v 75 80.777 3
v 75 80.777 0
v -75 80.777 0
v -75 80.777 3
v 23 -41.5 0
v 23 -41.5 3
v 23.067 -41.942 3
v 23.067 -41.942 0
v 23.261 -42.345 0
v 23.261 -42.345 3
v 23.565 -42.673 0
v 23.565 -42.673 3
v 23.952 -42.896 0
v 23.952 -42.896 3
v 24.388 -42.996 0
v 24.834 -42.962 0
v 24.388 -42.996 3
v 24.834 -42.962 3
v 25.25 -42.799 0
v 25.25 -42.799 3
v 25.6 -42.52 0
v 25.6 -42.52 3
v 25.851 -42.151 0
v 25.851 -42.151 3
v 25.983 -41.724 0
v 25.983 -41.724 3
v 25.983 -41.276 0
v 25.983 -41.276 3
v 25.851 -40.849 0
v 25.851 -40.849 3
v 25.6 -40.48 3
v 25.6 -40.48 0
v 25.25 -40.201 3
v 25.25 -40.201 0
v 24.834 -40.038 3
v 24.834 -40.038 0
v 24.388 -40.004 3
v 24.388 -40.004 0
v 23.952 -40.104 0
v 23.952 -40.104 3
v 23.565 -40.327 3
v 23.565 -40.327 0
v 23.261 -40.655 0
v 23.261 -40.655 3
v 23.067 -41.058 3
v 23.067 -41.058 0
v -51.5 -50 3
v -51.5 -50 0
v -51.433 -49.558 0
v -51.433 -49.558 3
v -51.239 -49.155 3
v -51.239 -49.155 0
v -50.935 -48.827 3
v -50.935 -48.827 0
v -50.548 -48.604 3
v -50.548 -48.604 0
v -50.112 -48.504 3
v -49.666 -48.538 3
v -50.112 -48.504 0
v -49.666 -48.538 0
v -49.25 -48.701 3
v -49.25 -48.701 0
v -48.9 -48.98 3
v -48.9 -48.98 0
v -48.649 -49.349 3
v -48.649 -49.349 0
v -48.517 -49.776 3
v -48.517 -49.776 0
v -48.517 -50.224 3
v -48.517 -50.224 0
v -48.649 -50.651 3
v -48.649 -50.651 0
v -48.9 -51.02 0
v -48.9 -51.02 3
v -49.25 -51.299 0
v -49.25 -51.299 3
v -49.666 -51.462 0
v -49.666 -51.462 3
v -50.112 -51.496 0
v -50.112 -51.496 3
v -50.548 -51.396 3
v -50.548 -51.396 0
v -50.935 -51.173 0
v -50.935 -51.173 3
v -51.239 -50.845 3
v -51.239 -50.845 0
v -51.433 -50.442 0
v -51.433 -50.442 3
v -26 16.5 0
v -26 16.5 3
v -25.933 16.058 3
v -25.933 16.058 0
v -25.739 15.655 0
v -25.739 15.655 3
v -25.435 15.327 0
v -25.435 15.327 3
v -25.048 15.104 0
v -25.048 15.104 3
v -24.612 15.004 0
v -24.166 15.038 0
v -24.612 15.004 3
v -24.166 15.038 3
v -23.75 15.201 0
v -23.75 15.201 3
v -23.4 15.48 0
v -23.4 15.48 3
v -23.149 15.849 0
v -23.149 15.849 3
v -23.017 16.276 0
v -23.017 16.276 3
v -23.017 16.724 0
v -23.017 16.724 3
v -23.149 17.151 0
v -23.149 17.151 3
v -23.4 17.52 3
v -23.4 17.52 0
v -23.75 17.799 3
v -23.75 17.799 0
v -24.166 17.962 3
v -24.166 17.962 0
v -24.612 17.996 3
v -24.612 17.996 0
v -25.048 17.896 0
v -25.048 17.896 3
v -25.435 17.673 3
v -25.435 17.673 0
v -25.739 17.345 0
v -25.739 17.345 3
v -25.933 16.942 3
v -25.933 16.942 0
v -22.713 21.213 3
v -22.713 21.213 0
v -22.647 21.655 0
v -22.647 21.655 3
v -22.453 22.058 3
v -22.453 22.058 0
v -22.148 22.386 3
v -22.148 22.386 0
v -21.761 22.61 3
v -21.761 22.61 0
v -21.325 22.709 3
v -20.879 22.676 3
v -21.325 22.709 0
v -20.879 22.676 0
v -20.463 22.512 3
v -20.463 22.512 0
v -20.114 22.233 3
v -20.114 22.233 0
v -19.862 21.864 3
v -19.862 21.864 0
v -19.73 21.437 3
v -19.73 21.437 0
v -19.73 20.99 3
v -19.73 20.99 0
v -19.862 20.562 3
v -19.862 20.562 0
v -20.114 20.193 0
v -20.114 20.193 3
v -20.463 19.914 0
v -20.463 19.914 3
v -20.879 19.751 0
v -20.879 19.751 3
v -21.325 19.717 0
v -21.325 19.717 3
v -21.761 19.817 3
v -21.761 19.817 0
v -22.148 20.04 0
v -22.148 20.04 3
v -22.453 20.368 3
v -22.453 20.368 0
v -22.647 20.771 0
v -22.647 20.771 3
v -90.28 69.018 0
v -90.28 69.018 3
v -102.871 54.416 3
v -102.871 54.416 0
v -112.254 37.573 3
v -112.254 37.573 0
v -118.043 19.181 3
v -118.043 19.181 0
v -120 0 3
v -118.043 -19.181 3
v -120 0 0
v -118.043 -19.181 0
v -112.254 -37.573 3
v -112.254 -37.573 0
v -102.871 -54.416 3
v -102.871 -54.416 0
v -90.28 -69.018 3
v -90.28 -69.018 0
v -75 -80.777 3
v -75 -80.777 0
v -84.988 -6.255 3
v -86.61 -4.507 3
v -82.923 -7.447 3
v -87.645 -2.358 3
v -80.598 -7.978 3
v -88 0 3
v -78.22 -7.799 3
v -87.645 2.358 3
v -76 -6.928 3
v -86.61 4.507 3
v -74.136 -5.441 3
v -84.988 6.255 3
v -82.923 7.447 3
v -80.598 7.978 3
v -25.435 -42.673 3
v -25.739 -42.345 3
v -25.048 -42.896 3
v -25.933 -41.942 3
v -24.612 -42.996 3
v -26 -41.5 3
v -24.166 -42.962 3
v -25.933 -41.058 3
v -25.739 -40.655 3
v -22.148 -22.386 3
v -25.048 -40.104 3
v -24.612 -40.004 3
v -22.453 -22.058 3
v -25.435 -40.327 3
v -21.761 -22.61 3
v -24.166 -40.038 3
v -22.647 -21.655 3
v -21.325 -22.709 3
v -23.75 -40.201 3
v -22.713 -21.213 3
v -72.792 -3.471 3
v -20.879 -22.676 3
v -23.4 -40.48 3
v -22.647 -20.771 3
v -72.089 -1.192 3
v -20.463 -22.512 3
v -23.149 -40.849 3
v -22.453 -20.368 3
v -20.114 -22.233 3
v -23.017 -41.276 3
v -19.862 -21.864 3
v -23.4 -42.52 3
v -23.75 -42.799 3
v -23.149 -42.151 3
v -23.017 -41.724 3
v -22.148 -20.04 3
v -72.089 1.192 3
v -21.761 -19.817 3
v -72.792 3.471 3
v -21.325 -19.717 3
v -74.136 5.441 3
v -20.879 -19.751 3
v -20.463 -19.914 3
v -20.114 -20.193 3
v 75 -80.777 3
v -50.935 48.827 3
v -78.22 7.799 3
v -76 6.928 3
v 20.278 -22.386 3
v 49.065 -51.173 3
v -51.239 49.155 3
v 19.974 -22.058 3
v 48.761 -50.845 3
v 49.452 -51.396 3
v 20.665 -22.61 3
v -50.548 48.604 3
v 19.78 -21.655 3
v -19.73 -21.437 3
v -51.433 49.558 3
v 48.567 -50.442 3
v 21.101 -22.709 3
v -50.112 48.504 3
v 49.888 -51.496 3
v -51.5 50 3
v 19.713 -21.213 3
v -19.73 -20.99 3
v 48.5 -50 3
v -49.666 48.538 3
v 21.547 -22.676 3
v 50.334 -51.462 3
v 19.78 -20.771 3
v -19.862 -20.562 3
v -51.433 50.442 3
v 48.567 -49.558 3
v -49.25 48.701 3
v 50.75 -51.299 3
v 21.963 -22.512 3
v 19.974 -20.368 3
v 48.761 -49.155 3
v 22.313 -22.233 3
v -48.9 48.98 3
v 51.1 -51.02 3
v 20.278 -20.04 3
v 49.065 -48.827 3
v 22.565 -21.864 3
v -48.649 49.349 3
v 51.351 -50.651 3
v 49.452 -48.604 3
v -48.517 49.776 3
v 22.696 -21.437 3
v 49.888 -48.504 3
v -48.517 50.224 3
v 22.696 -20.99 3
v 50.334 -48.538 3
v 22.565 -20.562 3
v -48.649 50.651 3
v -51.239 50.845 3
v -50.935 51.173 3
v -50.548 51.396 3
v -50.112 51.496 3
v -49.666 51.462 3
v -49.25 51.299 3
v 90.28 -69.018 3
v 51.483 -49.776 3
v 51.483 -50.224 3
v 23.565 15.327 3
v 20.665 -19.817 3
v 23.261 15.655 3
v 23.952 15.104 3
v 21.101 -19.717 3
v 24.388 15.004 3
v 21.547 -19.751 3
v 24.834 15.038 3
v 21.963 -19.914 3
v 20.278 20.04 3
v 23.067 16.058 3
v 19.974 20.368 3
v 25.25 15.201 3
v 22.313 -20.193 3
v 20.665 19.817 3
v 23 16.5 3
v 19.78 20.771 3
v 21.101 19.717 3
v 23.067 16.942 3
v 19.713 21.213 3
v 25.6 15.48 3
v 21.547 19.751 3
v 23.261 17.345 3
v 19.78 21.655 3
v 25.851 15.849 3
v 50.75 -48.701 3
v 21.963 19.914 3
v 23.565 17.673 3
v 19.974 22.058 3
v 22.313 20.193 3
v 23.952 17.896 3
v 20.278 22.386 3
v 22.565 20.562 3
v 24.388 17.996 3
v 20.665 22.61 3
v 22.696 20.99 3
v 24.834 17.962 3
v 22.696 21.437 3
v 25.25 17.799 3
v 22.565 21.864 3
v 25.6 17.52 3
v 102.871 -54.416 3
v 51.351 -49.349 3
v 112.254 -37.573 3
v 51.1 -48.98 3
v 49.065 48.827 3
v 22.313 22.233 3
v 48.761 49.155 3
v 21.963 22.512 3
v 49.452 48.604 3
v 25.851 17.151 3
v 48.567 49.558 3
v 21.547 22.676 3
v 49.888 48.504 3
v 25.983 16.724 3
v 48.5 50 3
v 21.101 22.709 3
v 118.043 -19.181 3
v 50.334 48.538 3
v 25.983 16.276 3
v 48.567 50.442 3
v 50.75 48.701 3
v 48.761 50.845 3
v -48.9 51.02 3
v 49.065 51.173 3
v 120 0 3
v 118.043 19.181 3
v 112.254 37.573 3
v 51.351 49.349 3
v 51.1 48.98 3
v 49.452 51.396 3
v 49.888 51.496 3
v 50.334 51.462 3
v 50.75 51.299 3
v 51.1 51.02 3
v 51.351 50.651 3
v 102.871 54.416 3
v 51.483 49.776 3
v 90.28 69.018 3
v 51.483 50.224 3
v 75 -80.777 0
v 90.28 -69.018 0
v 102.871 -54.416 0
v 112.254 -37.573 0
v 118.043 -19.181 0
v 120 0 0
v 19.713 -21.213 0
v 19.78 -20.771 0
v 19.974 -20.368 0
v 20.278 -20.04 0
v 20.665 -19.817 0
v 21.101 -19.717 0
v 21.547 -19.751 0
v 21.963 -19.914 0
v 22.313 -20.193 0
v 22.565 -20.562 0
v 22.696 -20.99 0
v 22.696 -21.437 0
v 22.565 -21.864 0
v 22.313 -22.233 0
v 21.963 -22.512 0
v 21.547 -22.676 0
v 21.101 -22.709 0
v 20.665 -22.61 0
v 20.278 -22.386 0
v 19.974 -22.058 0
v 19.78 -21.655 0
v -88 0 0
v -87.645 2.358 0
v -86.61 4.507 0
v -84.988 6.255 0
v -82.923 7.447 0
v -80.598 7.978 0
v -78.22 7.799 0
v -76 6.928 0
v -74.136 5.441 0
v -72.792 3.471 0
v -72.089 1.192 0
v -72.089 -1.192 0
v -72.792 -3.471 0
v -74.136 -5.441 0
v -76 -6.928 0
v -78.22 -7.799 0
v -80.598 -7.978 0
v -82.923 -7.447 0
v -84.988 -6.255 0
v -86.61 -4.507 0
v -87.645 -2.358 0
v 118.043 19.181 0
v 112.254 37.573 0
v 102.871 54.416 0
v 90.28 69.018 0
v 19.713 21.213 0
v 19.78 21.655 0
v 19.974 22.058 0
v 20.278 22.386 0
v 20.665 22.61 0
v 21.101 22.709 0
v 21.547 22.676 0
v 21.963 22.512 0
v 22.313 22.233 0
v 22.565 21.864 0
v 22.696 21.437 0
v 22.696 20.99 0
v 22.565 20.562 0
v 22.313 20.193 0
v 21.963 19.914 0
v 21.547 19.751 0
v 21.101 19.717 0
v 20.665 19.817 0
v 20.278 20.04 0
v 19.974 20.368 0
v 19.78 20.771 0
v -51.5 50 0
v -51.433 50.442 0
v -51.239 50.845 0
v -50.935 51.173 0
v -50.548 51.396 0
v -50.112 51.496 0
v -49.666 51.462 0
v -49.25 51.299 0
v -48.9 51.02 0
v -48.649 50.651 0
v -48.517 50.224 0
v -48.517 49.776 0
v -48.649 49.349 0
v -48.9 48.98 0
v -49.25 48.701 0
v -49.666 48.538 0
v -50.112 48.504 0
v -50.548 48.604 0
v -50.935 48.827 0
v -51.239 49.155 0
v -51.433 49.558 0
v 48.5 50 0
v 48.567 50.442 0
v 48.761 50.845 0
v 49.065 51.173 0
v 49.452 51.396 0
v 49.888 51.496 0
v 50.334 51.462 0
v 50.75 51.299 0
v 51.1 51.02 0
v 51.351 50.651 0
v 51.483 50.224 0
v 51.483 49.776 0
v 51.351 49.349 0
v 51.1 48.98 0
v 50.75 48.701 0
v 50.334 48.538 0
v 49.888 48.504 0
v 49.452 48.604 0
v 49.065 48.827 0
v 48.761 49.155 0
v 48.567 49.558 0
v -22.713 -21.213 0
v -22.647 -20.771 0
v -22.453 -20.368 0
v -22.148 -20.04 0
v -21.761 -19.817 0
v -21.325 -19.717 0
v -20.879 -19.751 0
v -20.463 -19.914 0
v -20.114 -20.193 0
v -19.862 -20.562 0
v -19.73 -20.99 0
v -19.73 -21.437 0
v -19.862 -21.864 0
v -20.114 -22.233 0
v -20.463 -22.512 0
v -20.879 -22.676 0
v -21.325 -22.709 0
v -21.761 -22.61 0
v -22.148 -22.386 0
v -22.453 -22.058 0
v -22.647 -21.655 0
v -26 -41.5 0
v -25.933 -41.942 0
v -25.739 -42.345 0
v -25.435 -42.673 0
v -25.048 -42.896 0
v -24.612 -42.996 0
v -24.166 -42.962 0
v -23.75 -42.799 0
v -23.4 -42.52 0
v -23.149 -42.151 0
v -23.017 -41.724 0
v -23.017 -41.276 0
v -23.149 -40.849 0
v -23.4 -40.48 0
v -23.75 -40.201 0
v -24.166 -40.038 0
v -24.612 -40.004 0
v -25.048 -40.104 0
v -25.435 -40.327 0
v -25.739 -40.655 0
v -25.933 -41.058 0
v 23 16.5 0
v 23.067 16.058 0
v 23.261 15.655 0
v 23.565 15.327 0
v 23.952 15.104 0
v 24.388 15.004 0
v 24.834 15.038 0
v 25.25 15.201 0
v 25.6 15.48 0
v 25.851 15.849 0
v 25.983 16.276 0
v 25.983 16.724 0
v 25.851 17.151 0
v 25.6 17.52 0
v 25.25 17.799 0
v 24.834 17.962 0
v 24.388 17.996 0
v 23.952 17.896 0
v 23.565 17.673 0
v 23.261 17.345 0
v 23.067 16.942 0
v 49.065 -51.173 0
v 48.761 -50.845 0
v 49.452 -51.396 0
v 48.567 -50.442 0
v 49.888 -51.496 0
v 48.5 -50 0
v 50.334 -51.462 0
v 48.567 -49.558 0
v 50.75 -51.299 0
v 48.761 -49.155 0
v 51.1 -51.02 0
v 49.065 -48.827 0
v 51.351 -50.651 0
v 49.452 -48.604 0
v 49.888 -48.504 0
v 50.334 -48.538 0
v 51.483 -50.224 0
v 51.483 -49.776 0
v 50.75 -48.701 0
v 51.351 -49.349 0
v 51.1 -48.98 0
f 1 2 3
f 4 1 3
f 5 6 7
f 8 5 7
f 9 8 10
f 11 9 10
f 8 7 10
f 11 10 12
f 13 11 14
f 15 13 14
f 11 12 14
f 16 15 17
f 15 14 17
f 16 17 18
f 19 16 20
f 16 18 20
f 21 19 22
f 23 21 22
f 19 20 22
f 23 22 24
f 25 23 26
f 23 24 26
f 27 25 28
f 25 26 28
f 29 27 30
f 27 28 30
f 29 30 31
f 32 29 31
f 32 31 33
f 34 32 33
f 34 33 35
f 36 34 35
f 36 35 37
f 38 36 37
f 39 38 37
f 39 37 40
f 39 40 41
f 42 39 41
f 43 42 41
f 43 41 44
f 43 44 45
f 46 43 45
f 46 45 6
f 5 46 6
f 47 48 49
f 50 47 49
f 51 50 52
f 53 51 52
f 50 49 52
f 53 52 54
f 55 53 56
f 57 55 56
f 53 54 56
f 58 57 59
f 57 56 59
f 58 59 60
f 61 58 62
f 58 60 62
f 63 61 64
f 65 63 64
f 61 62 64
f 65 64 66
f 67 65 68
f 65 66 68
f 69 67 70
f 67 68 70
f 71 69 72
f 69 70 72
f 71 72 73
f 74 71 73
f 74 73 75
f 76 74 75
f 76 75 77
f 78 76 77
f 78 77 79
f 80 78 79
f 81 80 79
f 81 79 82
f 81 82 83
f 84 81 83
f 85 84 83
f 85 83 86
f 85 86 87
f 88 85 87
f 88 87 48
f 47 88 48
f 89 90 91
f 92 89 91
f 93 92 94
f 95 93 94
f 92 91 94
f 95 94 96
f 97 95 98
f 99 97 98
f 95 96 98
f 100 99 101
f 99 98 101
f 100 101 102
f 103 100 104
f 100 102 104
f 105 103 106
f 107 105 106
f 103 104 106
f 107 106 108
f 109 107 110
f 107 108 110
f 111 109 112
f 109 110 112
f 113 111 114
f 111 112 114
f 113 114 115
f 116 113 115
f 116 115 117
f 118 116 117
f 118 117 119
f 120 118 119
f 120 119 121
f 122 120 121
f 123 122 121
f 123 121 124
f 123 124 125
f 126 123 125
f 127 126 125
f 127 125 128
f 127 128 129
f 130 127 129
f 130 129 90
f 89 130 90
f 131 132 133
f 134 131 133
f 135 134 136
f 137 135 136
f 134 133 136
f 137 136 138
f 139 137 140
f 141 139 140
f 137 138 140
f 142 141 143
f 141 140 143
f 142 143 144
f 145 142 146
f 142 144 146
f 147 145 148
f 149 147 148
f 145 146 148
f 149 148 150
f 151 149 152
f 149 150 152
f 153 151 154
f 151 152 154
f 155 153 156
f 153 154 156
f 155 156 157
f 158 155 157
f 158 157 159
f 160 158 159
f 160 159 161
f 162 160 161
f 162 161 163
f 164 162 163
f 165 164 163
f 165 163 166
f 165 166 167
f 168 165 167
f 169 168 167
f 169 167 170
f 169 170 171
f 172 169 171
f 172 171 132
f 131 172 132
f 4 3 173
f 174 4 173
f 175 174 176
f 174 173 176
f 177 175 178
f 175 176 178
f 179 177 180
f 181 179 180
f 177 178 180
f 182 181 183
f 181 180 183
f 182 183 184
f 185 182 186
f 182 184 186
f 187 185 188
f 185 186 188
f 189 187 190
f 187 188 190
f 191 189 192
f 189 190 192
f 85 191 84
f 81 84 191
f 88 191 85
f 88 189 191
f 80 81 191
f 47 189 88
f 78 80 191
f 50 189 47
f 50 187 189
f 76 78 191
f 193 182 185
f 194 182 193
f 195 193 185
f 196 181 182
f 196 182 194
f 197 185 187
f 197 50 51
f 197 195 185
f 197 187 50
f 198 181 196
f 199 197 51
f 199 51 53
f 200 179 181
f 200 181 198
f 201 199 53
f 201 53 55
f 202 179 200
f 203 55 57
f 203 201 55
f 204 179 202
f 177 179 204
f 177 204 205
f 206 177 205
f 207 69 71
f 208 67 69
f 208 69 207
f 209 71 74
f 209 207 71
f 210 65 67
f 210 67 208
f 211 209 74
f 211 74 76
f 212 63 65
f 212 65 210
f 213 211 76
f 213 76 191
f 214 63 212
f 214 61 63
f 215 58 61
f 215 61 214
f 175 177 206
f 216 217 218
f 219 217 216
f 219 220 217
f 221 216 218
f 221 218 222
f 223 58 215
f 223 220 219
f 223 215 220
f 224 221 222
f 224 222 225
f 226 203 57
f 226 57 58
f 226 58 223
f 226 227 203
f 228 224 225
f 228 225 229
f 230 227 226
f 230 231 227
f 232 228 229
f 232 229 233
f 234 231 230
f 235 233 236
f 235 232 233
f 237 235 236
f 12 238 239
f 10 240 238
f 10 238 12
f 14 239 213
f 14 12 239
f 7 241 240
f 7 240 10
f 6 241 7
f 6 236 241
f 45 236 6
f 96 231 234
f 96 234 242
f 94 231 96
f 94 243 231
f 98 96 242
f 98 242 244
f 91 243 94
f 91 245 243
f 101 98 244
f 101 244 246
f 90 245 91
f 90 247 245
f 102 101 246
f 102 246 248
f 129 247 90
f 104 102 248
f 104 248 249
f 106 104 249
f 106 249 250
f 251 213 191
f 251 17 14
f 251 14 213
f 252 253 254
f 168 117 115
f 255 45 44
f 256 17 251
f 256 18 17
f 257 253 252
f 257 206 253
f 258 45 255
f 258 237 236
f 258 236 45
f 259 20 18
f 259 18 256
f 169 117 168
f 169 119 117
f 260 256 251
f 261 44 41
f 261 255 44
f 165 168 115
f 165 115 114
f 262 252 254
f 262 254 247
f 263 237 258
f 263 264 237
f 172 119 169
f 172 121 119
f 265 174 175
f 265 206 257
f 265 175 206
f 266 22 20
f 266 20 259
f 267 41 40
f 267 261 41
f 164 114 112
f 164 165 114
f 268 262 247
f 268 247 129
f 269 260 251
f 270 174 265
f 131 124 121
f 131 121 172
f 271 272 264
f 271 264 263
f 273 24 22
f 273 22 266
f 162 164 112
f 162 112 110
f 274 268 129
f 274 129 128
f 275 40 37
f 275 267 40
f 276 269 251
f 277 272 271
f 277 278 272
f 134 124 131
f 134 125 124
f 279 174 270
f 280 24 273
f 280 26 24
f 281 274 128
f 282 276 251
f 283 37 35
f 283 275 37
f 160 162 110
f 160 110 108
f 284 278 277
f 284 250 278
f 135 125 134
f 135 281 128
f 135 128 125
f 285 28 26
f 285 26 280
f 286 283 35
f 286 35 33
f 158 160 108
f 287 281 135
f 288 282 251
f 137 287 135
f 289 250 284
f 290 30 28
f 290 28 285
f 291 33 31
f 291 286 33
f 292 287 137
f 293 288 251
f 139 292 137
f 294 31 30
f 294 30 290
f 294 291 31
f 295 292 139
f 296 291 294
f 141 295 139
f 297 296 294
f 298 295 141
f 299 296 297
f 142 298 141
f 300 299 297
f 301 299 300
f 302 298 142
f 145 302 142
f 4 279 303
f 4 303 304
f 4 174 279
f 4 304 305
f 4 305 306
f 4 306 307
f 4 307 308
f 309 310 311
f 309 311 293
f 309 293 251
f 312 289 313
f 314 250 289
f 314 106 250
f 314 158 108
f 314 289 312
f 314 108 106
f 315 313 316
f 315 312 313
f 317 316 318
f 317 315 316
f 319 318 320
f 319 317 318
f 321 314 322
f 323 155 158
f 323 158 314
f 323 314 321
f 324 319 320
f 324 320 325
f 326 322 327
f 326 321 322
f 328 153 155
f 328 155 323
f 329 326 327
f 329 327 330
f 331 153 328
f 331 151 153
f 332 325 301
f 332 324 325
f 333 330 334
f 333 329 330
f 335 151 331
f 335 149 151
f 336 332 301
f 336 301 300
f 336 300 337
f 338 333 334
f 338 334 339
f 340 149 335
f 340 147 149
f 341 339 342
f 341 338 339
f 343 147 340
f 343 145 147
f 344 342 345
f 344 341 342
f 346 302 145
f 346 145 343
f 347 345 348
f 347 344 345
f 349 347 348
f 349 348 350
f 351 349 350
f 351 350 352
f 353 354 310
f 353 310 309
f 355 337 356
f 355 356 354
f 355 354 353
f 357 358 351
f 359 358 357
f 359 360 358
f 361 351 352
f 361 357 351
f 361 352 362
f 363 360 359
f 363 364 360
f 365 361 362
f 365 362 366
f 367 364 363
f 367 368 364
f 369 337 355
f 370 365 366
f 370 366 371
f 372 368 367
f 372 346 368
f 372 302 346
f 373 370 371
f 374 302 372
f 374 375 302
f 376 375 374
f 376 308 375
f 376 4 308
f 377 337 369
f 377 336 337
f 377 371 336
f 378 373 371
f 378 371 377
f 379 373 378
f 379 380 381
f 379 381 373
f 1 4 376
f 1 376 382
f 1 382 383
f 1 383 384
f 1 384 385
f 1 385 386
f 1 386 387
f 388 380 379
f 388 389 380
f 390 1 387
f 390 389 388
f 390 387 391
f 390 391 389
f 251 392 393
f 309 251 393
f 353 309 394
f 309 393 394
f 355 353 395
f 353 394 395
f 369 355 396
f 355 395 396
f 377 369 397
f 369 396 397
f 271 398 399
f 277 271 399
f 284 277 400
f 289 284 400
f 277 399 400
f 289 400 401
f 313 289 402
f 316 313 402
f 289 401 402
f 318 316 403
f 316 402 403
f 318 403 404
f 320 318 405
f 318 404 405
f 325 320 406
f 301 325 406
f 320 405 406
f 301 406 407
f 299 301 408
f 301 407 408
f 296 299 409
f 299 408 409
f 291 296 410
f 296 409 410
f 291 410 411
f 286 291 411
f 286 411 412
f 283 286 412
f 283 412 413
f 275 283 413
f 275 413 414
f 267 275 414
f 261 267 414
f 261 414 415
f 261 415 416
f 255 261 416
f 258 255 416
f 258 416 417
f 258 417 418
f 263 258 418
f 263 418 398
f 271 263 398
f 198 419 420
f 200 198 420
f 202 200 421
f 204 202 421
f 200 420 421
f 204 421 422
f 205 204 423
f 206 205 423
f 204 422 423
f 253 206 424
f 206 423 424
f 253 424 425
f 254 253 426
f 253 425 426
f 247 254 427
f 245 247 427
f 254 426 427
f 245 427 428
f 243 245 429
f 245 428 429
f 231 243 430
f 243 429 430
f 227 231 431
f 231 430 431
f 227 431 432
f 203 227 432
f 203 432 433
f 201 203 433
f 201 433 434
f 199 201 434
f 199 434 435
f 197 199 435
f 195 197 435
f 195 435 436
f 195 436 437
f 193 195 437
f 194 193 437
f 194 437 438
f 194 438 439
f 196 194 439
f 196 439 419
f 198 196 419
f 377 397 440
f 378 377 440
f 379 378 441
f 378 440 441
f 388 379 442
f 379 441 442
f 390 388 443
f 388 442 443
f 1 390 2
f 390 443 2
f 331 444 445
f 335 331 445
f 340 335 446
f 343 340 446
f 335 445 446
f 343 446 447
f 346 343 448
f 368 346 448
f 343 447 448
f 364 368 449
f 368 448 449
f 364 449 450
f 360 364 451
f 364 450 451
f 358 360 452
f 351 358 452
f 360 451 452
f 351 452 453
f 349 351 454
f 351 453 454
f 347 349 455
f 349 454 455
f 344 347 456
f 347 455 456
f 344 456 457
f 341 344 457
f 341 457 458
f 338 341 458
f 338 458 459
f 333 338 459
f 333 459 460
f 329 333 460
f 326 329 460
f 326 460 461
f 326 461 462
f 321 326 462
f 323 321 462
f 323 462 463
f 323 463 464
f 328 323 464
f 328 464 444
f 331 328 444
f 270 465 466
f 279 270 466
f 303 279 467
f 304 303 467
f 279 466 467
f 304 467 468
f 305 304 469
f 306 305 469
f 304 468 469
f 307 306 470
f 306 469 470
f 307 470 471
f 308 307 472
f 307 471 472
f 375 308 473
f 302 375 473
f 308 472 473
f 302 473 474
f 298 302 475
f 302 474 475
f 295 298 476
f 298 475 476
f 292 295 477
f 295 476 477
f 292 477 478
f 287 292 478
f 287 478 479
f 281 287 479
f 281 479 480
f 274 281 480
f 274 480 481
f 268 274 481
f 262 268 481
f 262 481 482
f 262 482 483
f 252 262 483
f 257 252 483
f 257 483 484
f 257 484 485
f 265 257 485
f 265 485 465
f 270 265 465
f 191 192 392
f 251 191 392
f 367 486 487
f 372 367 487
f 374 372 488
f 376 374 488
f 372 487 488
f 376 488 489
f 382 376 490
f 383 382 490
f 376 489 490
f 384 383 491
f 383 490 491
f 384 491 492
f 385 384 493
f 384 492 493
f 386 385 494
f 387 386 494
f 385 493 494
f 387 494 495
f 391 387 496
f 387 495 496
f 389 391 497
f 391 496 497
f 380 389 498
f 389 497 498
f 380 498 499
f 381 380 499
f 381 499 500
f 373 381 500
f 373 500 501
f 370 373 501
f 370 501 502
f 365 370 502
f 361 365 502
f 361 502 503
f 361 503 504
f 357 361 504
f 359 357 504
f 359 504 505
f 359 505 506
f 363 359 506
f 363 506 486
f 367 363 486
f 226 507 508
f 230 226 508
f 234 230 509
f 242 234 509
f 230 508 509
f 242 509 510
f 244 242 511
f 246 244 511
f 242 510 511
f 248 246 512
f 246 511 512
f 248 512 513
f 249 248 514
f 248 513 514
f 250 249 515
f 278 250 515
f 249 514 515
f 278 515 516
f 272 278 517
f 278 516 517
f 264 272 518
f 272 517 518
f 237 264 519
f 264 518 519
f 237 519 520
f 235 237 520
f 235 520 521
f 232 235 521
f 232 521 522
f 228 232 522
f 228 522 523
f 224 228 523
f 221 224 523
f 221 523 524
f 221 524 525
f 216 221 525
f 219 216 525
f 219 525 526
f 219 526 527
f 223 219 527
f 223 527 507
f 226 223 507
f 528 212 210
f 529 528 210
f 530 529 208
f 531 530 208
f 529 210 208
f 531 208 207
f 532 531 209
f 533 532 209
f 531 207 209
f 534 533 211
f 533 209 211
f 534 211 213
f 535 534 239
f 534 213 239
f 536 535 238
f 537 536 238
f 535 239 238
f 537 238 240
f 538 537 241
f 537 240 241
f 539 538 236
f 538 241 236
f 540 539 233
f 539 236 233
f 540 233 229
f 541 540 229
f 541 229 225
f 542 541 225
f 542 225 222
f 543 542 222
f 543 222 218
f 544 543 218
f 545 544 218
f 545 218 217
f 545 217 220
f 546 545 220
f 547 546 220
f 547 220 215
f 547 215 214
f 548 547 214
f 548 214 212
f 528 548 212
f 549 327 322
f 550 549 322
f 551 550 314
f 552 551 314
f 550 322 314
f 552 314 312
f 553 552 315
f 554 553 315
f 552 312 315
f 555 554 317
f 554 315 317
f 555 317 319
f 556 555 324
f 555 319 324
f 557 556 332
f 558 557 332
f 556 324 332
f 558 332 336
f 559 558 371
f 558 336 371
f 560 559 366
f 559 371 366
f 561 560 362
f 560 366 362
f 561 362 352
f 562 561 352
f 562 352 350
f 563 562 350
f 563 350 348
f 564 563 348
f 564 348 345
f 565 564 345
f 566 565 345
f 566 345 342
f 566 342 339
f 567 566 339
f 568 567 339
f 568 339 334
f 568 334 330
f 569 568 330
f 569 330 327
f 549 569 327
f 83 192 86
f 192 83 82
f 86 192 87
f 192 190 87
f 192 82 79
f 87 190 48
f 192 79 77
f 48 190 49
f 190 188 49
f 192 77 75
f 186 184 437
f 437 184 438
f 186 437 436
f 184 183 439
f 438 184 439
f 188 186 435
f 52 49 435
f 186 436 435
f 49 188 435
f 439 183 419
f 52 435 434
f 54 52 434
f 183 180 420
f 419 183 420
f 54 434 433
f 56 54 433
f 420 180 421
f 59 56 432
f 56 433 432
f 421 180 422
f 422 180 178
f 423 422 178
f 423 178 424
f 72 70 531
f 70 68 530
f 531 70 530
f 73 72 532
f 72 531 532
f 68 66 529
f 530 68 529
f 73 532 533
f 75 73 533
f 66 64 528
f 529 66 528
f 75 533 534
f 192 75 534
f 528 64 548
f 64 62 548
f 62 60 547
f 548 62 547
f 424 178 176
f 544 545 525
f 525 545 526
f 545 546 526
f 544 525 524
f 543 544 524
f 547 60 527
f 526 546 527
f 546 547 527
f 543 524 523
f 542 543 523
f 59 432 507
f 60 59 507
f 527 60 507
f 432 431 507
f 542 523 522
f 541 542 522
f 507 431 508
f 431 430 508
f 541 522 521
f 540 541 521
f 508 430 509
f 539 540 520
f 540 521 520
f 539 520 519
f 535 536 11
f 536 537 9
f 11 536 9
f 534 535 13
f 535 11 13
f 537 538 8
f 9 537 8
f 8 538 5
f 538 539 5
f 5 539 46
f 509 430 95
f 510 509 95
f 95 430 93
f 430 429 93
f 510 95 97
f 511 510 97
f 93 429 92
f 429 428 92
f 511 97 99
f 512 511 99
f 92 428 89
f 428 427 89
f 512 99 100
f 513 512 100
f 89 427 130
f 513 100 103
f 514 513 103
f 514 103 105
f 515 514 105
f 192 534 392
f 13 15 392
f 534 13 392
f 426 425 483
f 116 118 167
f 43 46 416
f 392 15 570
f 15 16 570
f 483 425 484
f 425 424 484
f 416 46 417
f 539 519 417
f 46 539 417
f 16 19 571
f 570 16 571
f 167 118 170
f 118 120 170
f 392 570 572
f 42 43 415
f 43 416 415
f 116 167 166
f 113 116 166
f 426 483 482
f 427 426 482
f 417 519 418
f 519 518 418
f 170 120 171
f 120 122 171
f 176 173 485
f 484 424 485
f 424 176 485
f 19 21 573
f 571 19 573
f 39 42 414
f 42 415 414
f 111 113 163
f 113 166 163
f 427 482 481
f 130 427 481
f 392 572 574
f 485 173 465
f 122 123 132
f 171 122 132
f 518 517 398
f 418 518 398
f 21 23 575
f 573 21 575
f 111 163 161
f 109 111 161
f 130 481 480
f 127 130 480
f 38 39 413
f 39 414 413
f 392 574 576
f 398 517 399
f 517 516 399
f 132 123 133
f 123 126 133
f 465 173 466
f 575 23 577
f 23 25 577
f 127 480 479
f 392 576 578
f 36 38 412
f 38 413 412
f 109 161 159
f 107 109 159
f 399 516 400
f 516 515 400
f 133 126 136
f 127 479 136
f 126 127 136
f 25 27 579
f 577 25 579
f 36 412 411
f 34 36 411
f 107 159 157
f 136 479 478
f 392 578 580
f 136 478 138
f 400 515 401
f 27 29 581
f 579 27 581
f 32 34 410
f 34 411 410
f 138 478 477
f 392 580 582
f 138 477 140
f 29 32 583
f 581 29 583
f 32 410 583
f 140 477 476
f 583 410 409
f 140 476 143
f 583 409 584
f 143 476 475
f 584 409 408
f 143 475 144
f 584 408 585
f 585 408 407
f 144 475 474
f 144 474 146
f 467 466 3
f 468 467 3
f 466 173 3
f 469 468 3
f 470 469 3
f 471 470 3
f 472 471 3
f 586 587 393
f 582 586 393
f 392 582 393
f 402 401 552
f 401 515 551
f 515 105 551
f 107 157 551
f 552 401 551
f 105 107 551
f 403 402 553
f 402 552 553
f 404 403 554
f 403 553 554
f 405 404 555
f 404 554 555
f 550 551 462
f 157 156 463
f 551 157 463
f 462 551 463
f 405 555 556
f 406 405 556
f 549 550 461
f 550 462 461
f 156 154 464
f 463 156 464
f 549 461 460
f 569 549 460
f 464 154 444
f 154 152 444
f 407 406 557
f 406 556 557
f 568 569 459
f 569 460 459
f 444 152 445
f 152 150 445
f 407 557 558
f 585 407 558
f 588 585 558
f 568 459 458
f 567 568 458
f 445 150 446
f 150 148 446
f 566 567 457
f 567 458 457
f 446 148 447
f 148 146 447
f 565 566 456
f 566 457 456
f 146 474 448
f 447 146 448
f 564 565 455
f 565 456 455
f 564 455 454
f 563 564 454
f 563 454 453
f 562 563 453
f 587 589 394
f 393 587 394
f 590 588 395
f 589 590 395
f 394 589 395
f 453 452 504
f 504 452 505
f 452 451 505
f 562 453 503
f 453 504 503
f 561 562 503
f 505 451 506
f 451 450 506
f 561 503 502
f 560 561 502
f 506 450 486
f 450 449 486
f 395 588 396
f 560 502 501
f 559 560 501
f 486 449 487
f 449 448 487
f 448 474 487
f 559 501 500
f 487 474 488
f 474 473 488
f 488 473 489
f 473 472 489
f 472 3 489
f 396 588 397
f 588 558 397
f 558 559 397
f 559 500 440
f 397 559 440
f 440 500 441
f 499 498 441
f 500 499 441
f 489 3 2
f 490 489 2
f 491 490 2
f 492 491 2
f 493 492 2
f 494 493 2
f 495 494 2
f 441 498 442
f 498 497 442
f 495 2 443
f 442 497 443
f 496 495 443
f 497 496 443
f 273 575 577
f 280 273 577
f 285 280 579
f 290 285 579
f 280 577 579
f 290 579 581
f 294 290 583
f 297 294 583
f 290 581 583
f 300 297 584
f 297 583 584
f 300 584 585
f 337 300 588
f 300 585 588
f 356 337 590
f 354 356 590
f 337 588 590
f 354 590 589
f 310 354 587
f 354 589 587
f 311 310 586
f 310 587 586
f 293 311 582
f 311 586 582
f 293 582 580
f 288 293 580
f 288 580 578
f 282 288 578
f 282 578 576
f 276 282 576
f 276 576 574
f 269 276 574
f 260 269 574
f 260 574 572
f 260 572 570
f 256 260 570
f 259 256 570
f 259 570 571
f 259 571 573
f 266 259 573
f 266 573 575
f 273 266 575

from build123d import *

# Parameters (mm, degrees)
F1_DEPTH = 3
F3_D     = 3
F5_D     = 3
F7_D     = 3
F9_D     = 16


with BuildPart() as f1:
    # F0 (on Top) → F1 (new body)
    with BuildSketch(Plane.XY):
        with BuildLine():
            Line((-25, 80.777472107), (-75, 80.777472107))
            ThreePointArc((-75, 80.777472107), (-120, 0), (-75, -80.777472107))
            Line((-75, -80.777472107), (-25, -80.777472107))
            ThreePointArc((-25, -80.777472107), (-70, 0), (-25, 80.777472107))
        make_face()
        with BuildLine():
            Line((25, 80.777472107), (-25, 80.777472107))
            ThreePointArc((-25, 80.777472107), (-70, 0), (-25, -80.777472107))
            Line((-25, -80.777472107), (25, -80.777472107))
            ThreePointArc((25, -80.777472107), (57.9909633635, -46.2331050223), (70, 0))
            ThreePointArc((70, 0), (57.9909633635, 46.2331050223), (25, 80.777472107))
        make_face()
        with BuildLine():
            Line((75, 80.777472107), (25, 80.777472107))
            ThreePointArc((25, 80.777472107), (57.9909633635, 46.2331050223), (70, 0))
            ThreePointArc((70, 0), (57.9909633635, -46.2331050223), (25, -80.777472107))
            Line((25, -80.777472107), (75, -80.777472107))
            ThreePointArc((75, -80.777472107), (107.9909633635, -46.2331050223), (120, 0))
            ThreePointArc((120, 0), (107.9909633635, 46.2331050223), (75, 80.777472107))
        make_face()
    extrude(amount=F1_DEPTH)

    # F3 (through all)
    with Locations(Plane.XY.offset(3)):
        with Locations((-50, 50), (50, 50), (50, -50), (-50, -50)):
            Hole(F3_D / 2)

    # F5 (through all)
    with Locations(Plane.XY.offset(3)):
        with Locations((-21.2132034356, 21.2132034356), (21.2132034356, 21.2132034356), (21.2132034356, -21.2132034356), (-21.2132034356, -21.2132034356)):
            Hole(F5_D / 2)

    # F7 (through all)
    with Locations(Plane(origin=(0, 0, 0), x_dir=(1, 0, 0), z_dir=(0, 0, -1))):
        with Locations((-24.5, 41.5), (24.5, 41.5), (24.5, -16.5), (-24.5, -16.5)):
            Hole(F7_D / 2)

    # F9 (through all)
    with Locations(Plane.XY.offset(3)):
        with Locations((-80, 0)):
            Hole(F9_D / 2)


solid = f1.part
